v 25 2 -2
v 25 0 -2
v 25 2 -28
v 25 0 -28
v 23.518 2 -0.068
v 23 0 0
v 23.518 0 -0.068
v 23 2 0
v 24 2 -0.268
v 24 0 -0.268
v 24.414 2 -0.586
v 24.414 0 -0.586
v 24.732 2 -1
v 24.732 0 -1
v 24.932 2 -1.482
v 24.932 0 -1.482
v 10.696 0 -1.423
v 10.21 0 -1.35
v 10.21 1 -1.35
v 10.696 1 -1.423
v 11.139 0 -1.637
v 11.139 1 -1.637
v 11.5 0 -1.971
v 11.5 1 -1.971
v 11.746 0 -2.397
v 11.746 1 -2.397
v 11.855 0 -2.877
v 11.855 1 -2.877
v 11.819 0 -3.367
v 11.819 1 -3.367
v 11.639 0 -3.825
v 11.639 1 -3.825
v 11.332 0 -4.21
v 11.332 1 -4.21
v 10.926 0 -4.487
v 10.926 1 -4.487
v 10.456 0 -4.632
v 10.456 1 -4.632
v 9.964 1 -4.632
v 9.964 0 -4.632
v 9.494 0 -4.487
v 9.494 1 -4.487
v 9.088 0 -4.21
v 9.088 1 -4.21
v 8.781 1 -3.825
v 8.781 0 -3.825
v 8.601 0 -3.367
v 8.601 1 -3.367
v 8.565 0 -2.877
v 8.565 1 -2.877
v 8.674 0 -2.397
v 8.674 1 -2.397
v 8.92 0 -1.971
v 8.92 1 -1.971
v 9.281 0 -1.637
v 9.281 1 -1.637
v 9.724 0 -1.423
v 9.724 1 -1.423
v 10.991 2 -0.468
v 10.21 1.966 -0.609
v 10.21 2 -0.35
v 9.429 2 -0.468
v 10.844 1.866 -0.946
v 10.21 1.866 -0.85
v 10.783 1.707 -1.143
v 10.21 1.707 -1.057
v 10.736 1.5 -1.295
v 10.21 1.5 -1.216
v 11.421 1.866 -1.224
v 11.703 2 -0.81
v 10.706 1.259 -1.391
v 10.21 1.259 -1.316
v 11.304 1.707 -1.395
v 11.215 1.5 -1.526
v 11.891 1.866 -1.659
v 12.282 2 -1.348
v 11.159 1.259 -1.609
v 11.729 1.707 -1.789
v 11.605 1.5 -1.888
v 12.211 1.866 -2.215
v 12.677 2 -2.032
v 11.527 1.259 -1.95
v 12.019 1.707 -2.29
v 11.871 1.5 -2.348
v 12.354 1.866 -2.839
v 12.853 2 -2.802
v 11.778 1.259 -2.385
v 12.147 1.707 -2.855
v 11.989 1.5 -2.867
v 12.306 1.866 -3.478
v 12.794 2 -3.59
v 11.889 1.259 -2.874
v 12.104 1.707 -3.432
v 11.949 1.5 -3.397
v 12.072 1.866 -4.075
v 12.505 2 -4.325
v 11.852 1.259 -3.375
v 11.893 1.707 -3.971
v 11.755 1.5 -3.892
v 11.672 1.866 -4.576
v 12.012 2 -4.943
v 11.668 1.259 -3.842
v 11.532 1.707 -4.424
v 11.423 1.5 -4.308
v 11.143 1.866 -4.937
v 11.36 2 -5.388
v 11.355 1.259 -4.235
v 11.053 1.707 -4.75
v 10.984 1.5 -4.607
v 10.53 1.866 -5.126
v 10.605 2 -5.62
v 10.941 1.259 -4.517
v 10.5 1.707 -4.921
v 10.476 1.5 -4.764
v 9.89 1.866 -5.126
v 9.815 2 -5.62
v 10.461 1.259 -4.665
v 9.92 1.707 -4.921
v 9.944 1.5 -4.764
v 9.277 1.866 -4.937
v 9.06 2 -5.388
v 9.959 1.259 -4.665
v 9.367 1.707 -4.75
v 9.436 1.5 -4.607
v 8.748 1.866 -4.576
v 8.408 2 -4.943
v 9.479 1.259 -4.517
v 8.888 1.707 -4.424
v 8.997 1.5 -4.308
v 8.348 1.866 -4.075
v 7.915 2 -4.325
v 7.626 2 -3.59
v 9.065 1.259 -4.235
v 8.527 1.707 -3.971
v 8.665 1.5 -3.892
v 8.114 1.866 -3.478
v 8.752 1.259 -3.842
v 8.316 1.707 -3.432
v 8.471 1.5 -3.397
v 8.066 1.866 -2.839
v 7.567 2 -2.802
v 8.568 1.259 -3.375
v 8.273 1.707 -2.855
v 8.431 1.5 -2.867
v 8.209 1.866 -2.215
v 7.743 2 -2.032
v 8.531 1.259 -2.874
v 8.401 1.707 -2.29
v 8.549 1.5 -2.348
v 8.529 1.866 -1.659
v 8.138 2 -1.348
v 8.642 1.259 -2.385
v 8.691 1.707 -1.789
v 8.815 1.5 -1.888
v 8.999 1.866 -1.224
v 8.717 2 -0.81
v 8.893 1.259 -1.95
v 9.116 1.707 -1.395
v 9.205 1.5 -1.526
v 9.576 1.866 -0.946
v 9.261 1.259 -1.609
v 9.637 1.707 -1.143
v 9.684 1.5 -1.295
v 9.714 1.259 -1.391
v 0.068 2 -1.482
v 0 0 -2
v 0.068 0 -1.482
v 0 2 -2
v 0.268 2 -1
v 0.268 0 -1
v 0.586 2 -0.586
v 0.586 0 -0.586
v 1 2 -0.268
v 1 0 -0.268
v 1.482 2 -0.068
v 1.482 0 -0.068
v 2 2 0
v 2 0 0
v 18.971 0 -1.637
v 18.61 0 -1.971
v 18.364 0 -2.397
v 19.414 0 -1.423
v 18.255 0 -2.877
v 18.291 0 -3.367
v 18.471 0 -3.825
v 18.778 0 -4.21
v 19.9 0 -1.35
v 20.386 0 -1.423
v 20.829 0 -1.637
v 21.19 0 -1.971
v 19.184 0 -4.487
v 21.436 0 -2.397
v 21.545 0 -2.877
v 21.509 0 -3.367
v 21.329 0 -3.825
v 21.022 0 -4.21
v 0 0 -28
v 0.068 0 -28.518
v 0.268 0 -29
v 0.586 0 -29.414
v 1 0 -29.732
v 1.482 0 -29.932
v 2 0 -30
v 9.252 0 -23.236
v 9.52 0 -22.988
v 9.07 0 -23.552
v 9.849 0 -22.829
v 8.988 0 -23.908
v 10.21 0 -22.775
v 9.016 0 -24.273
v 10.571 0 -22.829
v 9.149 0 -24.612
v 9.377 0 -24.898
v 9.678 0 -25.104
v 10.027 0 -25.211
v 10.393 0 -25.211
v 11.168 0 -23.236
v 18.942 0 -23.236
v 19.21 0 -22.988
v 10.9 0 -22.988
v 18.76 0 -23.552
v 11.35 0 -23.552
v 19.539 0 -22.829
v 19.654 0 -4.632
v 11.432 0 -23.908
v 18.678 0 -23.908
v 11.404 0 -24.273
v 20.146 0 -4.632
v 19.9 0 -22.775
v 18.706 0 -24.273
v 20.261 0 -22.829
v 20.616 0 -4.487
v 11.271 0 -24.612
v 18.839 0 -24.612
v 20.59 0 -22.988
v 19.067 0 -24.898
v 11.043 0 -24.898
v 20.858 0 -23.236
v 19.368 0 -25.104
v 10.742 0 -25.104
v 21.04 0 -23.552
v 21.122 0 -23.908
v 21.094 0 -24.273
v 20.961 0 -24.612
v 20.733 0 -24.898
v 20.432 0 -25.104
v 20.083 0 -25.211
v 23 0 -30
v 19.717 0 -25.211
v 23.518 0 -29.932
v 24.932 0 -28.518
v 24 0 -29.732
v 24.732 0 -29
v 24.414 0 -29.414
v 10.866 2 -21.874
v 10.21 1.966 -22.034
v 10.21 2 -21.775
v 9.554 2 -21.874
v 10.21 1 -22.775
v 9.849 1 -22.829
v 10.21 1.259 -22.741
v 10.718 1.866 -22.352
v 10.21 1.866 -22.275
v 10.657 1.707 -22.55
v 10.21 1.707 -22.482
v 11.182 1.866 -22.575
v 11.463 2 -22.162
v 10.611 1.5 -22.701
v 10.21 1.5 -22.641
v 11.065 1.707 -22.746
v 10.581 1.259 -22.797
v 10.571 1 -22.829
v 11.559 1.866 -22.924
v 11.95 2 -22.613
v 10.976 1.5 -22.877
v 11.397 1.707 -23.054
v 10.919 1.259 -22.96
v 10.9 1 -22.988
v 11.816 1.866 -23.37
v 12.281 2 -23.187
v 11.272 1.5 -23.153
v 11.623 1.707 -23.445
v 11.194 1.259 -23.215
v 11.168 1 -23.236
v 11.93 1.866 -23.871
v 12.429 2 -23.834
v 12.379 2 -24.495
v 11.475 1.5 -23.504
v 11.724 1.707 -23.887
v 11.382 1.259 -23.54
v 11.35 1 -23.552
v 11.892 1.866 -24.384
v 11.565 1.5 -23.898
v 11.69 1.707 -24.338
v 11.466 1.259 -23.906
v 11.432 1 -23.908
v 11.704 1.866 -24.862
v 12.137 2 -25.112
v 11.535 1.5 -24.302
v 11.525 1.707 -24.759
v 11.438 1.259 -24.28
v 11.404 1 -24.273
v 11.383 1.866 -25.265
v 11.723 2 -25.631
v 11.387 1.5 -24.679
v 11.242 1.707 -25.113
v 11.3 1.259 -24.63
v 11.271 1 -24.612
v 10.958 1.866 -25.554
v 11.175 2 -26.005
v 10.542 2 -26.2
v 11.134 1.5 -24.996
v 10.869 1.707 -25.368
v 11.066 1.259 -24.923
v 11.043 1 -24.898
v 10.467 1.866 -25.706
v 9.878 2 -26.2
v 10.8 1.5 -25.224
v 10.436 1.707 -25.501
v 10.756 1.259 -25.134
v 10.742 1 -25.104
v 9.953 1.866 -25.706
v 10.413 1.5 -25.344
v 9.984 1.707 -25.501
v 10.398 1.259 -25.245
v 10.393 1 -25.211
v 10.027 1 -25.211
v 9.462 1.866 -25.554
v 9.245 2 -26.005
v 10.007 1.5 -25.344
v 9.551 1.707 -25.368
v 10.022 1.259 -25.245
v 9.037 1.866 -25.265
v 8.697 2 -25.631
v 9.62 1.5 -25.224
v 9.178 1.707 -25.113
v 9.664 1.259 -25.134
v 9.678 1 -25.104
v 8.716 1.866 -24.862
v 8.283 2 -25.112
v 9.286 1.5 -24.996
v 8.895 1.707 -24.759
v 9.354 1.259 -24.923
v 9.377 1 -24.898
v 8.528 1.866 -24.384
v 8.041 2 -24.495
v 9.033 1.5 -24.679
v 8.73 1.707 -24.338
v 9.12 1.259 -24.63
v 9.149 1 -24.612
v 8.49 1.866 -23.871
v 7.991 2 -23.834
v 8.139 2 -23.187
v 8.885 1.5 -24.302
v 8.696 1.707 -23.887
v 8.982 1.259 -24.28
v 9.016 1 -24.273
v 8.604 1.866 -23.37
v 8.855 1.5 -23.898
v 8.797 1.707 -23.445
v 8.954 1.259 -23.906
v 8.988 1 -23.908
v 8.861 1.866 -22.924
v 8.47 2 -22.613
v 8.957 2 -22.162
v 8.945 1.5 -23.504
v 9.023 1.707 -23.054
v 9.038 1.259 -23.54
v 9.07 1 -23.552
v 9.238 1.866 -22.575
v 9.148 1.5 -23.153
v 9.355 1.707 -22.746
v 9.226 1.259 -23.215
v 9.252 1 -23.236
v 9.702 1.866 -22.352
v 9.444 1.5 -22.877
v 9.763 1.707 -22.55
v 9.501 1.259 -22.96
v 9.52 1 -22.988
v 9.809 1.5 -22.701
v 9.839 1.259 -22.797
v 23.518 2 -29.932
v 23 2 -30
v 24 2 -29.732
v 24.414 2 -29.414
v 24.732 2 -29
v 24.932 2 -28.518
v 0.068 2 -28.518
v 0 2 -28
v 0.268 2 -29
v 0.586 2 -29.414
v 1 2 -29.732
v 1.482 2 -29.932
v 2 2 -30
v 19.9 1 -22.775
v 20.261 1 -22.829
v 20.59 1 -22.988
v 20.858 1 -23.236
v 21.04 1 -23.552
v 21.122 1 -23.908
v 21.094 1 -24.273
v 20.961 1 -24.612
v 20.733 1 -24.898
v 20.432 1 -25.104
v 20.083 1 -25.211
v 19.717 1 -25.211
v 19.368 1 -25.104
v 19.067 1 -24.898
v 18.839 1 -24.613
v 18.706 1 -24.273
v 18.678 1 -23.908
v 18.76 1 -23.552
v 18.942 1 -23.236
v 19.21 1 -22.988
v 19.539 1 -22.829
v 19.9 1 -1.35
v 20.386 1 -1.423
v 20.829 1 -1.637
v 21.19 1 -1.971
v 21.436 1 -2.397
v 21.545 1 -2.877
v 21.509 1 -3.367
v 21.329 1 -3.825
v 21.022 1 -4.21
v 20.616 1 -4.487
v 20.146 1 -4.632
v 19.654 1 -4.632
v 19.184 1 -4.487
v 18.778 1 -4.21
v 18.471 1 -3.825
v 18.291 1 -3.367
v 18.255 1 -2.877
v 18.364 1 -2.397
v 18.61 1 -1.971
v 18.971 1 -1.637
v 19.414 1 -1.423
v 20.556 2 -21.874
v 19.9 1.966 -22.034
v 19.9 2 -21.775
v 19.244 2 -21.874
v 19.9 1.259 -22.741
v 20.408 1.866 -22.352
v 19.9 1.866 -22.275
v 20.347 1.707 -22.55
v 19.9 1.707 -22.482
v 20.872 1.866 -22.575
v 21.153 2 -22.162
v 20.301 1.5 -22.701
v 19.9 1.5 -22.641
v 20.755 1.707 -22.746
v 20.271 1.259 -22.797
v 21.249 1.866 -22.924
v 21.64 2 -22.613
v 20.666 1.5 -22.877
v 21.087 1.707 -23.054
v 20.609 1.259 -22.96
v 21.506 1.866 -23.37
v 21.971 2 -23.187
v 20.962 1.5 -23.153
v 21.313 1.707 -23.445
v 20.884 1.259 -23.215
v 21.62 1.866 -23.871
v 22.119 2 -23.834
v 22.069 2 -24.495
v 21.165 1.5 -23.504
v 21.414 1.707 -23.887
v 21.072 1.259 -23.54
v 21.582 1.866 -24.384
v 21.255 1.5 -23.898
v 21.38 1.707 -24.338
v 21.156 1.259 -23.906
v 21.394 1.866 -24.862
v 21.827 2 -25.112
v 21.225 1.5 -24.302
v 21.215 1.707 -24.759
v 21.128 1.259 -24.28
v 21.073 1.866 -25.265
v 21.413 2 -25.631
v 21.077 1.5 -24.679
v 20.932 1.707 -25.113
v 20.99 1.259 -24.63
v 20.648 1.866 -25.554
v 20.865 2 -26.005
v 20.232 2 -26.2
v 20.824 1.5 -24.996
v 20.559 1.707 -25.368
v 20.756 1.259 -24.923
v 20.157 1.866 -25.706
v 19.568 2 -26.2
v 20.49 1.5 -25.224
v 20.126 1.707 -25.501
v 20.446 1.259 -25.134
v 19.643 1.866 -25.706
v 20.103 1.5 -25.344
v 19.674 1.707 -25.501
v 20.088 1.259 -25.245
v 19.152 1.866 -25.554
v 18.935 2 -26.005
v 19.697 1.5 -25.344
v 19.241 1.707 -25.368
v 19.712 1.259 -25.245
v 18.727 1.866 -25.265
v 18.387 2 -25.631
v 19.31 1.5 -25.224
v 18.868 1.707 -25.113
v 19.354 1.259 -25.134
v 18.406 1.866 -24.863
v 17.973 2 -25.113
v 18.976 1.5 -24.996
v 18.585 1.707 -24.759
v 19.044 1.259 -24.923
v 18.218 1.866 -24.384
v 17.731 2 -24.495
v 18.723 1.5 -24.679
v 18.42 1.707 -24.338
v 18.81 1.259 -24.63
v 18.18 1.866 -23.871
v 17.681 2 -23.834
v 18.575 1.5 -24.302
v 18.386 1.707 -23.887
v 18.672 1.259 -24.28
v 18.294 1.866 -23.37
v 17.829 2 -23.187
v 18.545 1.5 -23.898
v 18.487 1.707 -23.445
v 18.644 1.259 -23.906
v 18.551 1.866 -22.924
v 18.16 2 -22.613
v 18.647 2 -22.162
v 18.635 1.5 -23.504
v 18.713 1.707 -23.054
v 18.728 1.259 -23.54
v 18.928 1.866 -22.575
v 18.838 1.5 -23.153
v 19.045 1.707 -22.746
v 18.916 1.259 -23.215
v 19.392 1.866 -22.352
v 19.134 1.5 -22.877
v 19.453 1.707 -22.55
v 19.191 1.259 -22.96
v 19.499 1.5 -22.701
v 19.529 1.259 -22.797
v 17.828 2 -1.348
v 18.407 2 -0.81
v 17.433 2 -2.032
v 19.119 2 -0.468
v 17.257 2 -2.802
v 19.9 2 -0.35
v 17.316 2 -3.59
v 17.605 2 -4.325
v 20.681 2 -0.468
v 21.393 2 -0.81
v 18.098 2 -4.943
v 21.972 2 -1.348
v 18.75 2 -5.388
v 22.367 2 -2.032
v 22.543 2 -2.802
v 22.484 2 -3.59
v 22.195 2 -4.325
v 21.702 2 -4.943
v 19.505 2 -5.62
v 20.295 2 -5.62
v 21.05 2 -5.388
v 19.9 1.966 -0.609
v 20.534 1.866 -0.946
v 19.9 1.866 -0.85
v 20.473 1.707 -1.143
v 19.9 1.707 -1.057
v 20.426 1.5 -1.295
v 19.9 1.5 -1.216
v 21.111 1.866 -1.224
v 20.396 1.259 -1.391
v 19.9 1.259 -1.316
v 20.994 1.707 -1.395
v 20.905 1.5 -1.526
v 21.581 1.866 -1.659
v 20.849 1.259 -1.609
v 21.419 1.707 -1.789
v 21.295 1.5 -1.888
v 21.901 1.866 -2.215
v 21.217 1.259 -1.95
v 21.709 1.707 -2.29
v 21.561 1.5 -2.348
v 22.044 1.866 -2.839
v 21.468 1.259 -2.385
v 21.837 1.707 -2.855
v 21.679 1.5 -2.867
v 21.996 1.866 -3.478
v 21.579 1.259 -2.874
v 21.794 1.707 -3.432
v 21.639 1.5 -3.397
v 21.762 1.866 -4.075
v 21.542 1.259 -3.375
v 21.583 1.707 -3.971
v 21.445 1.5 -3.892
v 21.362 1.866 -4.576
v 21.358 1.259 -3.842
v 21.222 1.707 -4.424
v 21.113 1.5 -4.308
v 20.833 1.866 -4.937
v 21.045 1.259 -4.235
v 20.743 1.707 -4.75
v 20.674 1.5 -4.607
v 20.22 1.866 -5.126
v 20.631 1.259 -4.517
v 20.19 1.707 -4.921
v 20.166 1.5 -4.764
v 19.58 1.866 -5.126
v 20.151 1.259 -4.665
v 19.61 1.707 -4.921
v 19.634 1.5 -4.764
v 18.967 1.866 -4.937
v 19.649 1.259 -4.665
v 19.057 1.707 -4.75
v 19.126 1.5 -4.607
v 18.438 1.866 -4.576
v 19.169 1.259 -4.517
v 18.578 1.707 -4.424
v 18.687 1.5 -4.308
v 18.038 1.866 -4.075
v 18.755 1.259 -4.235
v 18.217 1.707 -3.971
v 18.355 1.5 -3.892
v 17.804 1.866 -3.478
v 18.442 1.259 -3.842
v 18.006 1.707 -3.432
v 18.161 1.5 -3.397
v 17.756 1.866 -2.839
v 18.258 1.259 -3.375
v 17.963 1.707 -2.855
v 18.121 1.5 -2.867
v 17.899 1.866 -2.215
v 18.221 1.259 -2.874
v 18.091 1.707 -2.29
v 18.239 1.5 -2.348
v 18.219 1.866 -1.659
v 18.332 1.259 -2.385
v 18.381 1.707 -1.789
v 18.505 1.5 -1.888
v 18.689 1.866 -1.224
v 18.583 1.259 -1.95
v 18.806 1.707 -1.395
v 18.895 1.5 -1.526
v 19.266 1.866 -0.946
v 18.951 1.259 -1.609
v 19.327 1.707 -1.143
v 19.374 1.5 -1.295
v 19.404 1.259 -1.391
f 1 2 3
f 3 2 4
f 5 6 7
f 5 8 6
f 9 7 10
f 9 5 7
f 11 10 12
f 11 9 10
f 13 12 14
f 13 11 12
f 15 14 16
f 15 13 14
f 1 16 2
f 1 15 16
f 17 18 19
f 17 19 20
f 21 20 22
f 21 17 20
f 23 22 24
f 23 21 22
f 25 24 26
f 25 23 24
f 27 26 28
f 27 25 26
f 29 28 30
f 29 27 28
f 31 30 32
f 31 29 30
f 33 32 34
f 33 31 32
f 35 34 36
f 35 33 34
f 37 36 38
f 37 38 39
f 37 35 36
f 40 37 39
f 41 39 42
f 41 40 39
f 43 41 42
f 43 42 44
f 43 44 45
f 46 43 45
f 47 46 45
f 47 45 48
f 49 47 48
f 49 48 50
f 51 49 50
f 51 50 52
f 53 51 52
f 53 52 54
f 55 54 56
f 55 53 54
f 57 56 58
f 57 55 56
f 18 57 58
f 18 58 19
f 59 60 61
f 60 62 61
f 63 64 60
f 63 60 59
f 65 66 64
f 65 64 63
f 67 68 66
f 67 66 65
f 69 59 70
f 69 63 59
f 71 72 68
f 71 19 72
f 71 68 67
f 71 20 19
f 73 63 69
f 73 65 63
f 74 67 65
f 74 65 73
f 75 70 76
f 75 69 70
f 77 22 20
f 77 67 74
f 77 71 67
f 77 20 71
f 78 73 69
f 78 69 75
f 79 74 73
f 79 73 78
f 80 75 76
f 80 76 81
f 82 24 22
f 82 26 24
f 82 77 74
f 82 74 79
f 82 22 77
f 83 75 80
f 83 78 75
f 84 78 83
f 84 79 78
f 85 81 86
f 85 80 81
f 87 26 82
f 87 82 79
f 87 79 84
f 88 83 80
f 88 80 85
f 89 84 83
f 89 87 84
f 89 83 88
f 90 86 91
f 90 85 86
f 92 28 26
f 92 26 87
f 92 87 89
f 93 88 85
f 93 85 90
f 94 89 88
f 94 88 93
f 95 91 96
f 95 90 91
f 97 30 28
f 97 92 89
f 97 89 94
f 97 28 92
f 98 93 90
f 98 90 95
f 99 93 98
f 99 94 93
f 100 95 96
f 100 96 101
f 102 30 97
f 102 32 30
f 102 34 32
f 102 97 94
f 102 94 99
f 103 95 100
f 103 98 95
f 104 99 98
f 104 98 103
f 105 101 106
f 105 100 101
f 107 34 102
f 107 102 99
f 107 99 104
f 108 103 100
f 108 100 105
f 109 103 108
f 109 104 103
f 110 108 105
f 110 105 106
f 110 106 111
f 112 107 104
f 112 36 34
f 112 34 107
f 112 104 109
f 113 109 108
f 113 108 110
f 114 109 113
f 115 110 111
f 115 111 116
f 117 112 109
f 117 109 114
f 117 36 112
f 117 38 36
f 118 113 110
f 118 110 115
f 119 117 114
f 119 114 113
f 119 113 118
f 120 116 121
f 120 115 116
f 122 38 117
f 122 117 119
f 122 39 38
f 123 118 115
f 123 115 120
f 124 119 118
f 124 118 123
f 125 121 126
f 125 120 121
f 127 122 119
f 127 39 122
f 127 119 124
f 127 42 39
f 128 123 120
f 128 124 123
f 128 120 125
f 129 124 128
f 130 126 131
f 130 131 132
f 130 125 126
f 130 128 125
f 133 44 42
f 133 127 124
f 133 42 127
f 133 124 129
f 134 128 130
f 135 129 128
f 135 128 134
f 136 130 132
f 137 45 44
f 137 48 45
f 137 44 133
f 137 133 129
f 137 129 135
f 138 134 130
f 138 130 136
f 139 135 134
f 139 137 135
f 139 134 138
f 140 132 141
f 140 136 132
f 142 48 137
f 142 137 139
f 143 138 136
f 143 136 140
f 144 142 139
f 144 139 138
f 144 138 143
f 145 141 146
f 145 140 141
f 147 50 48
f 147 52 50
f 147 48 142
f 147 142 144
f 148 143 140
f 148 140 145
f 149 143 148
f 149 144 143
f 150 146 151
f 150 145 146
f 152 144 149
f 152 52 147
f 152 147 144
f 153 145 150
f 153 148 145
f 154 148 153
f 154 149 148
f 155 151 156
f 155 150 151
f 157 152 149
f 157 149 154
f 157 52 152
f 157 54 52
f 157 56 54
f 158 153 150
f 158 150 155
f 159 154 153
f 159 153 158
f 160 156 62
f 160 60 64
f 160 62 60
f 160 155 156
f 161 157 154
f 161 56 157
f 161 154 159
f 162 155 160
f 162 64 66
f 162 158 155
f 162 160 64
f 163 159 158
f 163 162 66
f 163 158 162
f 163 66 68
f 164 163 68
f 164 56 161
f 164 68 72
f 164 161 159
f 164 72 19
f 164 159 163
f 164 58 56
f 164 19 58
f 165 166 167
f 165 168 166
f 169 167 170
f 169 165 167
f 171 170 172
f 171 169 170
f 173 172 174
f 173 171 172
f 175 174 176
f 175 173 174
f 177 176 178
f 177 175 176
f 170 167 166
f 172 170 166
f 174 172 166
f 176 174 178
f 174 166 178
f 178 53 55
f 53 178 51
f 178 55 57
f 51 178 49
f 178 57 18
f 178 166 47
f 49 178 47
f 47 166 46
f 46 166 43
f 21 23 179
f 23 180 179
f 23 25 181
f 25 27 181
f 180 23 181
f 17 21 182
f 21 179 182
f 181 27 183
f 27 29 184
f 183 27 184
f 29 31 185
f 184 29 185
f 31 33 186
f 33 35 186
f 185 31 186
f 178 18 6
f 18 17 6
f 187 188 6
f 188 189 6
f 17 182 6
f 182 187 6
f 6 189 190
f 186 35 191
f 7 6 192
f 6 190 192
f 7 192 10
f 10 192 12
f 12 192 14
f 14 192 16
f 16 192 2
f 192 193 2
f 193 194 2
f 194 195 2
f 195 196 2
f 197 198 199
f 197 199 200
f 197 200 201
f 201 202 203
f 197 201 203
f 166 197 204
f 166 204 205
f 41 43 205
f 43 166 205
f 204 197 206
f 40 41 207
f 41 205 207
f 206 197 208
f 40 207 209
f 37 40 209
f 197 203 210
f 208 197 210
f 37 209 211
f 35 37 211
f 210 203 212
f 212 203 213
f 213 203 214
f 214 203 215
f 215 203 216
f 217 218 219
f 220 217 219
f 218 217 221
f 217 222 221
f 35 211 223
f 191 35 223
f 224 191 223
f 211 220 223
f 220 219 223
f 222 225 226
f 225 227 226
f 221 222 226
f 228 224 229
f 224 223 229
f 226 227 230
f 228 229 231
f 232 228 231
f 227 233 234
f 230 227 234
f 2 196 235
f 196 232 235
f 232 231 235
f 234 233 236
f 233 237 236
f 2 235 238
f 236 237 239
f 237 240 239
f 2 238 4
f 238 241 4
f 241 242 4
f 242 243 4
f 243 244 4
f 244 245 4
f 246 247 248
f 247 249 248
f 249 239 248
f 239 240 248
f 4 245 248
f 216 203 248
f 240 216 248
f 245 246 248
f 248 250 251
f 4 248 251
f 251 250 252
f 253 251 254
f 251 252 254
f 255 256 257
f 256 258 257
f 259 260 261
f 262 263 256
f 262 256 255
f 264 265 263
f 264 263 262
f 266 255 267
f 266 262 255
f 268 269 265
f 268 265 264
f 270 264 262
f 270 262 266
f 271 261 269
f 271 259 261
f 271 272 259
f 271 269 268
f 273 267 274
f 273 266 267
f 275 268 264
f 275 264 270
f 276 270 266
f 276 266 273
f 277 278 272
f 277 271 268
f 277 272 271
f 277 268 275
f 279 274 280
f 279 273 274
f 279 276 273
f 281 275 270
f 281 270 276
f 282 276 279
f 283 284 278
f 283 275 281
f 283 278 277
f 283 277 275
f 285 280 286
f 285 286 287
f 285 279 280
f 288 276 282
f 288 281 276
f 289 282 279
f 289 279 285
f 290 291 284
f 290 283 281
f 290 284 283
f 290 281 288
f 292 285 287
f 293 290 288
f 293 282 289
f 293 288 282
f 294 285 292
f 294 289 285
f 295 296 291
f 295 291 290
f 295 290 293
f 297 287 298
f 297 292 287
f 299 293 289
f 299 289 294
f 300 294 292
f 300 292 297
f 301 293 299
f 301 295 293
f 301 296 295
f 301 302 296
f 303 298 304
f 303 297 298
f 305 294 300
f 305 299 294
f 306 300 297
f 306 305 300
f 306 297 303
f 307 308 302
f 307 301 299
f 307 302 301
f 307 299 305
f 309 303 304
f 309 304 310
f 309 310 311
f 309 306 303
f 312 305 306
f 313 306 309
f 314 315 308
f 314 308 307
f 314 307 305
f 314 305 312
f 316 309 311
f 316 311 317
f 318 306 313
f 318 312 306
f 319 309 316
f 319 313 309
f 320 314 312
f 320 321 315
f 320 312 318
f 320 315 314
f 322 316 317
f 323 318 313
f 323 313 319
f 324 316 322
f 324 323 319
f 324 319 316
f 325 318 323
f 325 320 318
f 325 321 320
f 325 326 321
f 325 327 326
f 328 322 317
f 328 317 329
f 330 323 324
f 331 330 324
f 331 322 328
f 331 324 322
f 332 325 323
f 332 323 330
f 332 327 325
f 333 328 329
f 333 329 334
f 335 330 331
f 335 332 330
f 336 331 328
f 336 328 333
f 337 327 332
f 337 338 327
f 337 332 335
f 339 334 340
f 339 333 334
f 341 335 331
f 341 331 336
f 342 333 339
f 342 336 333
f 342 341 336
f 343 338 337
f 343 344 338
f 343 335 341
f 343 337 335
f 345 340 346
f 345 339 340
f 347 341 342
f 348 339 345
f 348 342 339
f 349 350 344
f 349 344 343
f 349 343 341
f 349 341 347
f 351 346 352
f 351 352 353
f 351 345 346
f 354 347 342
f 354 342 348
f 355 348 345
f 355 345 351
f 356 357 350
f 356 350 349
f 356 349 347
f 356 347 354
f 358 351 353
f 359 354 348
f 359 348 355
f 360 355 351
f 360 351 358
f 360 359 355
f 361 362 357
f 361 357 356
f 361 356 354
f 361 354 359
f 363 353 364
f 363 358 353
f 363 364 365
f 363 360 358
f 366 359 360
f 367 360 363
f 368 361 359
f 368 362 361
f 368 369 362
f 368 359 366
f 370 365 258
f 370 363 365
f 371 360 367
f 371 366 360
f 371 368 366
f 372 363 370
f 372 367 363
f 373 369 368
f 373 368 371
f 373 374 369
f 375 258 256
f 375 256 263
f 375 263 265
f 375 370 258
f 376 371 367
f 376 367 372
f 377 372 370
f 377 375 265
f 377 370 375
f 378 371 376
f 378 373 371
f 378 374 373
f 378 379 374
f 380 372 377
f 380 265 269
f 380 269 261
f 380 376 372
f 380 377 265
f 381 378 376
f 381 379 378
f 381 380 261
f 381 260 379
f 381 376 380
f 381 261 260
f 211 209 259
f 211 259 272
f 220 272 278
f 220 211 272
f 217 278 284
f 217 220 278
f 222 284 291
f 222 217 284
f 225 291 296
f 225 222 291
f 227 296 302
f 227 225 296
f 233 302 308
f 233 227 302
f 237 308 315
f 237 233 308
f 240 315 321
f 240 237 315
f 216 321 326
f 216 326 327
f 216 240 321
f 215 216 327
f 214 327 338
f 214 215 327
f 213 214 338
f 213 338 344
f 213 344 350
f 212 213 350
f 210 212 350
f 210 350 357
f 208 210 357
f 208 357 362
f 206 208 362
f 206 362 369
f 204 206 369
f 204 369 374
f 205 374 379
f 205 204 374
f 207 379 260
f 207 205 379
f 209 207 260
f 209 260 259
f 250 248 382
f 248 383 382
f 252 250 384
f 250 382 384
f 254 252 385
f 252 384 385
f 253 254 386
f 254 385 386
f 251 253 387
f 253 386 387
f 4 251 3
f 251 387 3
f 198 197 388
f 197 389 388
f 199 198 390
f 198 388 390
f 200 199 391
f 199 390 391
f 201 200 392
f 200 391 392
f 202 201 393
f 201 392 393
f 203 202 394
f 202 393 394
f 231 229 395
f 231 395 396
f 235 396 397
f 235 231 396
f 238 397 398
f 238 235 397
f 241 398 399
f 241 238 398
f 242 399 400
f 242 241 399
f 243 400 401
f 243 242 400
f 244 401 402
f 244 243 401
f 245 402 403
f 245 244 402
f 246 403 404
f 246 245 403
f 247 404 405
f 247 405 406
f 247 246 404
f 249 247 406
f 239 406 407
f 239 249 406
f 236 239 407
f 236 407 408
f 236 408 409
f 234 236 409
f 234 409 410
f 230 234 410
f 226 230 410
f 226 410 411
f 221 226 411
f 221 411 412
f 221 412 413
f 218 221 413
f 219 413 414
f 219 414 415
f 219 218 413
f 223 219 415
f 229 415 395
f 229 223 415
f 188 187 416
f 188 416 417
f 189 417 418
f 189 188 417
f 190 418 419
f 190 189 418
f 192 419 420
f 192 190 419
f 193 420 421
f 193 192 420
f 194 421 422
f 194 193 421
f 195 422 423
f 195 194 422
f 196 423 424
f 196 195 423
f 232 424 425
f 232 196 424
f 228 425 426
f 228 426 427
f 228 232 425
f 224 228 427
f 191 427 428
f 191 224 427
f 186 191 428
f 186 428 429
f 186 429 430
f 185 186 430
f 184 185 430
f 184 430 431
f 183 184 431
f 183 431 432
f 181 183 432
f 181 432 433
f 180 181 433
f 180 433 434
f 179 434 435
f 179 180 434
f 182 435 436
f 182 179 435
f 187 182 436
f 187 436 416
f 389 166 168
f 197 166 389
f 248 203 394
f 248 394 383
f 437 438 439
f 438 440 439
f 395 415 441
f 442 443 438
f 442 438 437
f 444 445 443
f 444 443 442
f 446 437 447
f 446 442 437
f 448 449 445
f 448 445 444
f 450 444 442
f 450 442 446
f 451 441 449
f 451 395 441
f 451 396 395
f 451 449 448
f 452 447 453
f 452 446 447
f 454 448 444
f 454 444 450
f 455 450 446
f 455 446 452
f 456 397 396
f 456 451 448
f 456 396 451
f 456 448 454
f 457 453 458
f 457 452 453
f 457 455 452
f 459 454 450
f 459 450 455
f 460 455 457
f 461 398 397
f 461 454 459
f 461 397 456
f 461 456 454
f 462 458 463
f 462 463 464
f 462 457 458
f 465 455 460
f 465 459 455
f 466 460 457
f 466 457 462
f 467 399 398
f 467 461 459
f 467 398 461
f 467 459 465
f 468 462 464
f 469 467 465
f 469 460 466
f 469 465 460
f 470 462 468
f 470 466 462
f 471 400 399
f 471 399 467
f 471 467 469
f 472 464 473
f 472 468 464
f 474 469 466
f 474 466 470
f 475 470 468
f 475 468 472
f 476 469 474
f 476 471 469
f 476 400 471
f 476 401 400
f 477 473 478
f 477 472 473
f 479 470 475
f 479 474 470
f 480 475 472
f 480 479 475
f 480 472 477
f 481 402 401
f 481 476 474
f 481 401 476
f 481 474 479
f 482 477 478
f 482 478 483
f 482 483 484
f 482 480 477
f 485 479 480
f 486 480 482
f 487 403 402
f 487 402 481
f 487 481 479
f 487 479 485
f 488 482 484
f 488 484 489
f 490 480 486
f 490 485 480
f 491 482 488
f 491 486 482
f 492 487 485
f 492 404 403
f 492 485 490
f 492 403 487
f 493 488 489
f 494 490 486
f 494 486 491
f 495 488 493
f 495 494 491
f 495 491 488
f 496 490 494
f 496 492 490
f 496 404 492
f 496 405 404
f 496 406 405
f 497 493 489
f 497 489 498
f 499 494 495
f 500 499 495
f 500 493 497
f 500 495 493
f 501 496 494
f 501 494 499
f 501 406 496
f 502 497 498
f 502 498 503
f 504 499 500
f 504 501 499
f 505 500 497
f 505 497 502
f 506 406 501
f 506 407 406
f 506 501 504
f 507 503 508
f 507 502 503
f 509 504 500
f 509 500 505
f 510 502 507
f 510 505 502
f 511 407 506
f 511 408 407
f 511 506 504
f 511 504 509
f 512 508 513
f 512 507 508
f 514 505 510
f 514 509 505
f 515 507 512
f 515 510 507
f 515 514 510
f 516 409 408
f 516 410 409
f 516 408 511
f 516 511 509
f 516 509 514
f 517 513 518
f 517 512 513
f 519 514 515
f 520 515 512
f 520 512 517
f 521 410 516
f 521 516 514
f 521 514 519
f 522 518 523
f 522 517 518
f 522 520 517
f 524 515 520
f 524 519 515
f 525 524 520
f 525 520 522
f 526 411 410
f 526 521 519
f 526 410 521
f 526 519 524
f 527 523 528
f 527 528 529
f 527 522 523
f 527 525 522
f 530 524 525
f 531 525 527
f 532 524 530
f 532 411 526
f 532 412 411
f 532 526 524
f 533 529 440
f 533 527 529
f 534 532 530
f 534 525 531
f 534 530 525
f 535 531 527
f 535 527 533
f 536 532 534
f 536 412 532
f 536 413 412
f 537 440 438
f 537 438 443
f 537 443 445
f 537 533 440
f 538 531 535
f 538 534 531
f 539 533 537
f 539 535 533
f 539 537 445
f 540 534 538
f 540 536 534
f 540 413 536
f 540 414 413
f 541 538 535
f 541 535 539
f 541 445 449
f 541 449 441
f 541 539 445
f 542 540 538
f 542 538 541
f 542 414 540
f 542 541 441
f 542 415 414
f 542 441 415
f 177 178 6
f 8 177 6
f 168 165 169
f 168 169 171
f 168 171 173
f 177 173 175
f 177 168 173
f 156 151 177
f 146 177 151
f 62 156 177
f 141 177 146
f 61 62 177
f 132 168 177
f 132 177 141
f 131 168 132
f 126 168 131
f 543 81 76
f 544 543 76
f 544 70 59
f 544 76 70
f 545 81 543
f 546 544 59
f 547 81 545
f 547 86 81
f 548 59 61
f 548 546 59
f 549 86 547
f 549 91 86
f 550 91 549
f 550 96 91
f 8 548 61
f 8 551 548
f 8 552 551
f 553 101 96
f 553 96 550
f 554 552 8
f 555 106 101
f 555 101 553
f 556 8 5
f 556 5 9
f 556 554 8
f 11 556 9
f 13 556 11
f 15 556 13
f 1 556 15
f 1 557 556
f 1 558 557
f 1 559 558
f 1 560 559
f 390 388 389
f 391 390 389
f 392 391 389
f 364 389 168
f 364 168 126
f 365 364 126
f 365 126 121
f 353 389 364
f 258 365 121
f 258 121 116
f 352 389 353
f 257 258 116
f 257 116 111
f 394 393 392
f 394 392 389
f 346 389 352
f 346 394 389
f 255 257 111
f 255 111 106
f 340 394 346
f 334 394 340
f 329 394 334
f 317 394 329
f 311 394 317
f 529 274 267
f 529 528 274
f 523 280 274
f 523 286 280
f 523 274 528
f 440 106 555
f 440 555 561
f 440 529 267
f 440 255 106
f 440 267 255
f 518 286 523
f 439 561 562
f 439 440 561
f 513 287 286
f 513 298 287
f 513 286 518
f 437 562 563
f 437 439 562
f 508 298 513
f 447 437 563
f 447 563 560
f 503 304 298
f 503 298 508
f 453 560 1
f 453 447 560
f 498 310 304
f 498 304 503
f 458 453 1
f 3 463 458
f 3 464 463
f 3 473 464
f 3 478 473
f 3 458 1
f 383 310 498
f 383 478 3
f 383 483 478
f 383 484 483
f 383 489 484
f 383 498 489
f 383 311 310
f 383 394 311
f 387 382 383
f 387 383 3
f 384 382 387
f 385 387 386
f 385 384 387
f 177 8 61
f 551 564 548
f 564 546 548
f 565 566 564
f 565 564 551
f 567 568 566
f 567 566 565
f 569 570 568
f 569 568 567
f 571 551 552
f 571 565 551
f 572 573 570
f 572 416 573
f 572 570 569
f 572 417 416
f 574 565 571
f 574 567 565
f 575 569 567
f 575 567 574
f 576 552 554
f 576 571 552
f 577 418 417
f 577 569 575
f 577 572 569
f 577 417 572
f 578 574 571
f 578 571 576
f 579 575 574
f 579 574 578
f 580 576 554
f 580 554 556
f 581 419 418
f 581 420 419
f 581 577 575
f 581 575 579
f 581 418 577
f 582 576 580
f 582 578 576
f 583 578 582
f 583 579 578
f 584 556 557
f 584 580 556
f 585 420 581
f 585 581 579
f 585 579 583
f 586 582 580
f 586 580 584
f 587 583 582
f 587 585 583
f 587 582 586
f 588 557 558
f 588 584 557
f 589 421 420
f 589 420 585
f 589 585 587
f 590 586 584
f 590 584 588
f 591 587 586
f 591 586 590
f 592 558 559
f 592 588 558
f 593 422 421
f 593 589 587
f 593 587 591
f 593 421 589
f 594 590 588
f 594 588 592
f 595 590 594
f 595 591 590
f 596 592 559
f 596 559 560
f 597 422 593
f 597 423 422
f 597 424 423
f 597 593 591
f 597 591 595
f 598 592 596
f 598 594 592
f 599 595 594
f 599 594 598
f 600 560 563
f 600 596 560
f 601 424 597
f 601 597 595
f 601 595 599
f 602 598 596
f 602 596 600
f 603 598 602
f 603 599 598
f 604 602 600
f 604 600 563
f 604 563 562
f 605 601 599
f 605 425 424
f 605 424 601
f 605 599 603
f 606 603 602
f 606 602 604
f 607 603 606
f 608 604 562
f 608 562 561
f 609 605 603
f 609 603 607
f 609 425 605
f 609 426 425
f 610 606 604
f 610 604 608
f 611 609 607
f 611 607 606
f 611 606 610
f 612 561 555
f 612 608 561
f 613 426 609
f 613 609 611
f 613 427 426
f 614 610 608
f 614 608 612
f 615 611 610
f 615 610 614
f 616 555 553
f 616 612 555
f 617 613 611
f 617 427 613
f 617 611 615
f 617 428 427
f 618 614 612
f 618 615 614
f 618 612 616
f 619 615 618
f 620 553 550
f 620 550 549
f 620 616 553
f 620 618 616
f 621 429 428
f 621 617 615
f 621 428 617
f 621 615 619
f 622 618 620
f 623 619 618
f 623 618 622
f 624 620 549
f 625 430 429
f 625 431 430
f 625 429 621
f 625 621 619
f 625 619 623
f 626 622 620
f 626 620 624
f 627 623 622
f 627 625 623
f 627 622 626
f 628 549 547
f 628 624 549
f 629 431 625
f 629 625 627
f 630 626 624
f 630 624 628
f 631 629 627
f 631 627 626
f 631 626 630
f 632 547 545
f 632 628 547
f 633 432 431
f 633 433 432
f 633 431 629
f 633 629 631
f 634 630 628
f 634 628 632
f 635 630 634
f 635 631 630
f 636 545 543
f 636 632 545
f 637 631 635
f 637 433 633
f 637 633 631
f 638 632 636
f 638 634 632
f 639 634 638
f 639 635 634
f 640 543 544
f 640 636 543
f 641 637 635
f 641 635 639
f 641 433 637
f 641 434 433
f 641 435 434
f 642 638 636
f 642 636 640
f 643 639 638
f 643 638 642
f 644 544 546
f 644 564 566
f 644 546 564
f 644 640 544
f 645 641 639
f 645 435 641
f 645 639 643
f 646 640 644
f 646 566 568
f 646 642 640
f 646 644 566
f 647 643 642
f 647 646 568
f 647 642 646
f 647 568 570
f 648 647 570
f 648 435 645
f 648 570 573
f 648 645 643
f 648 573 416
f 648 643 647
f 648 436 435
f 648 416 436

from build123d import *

# Parameters (mm, degrees)
SKETCH2_W           = 25
SKETCH2_H           = 30
SKETCH2_R           = 1.225
SKETCH2_R_2         = 1.65
BOSS_EXTRUDE2_DEPTH = 2
FILLET1_R           = 2
FILLET2_R           = 1


with BuildPart() as part:
    # Sketch2 → Boss-Extrude2 (new body)
    with BuildSketch(Plane(origin=(0, 0, 0), x_dir=(1, 0, 0), z_dir=(0, 1, 0))):
        with Locations((12.5, 15)):
            Rectangle(SKETCH2_W, SKETCH2_H)
        with Locations(Location((19.9, 24, 0), (0, 0, 270))):
            Circle(SKETCH2_R, mode=Mode.SUBTRACT)
        with Locations(Location((10.21, 24, 0), (0, 0, 270))):
            Circle(SKETCH2_R, mode=Mode.SUBTRACT)
        with Locations(Location((10.21, 3, 0), (0, 0, 270))):
            Circle(SKETCH2_R_2, mode=Mode.SUBTRACT)
        with Locations(Location((19.9, 3, 0), (0, 0, 270))):
            Circle(SKETCH2_R_2, mode=Mode.SUBTRACT)
    extrude(amount=BOSS_EXTRUDE2_DEPTH)

    # Fillet1
    fillet1_edges = [part.edges().sort_by_distance(p)[0] for p in [
        (0, 1, -30),
        (25, 1, -30),
        (25, 1, 0),
        (0, 1, 0),
    ]]
    fillet(fillet1_edges, radius=FILLET1_R)

    # Fillet2
    fillet2_edges = [part.edges().sort_by_distance(p)[0] for p in [
        (19.9, 2, -25.225),
        (10.21, 2, -25.225),
        (10.21, 2, -4.65),
        (19.9, 2, -4.65),
    ]]
    fillet(fillet2_edges, radius=FILLET2_R)


solid = part.part
